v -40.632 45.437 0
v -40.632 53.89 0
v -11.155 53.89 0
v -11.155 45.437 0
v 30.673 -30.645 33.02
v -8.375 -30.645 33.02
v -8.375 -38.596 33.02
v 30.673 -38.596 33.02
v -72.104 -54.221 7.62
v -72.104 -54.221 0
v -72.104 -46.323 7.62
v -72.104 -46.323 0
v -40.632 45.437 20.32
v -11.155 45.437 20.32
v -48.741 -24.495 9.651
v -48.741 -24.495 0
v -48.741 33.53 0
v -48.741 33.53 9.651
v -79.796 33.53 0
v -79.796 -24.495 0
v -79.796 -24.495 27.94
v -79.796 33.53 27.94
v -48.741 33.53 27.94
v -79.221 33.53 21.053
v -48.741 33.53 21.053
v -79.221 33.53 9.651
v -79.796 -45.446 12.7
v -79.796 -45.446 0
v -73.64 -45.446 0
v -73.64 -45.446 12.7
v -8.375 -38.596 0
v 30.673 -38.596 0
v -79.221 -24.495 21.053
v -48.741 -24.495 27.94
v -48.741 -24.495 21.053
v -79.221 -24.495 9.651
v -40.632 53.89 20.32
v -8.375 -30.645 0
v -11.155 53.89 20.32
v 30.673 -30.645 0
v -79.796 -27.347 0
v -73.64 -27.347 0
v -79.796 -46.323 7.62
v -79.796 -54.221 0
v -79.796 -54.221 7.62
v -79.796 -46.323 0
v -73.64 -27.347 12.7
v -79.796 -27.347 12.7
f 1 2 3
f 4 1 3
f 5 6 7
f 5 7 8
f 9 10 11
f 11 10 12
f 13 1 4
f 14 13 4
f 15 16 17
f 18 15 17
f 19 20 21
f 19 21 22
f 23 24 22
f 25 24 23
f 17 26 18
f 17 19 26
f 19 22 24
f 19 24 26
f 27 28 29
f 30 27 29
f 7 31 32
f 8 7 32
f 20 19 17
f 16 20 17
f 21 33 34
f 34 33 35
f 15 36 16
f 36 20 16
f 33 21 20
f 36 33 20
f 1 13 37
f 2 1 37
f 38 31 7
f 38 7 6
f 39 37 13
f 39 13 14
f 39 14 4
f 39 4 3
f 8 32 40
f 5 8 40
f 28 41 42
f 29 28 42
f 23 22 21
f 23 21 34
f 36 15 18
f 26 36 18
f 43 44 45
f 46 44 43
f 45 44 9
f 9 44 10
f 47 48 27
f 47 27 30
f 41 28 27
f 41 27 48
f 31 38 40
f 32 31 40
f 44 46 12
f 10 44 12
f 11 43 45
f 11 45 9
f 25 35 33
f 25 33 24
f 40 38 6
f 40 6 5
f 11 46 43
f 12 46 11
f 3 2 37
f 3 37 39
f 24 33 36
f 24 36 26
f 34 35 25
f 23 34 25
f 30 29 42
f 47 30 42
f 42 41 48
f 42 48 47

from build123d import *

# Parameters (mm, degrees)
F0_W     = 31.0551151633
F0_H     = 58.0248460174
F1_DEPTH = 27.94
F0_W_2   = 6.1559900641
F0_H_2   = 18.0984884501
F2_DEPTH = 12.7
F0_W_3   = 7.6916143298
F0_H_3   = 7.8975185752
F3_DEPTH = 7.62
F0_W_4   = 39.0488561243
F0_H_4   = 7.9504065216
F4_DEPTH = 33.02
F0_W_5   = 29.4771557674
F0_H_5   = 8.4530077875
F5_DEPTH = 20.32
F6_W     = 58.0248460174
F6_H     = 11.4022633061
F7_DEPTH = 30.48


with BuildPart() as f1:
    # F0 (on Top) → F1 (new body)
    with BuildSketch(Plane.XY):
        with Locations((-64.2681159079, 4.5171789825)):
            Rectangle(F0_W, F0_H)
    extrude(amount=F1_DEPTH)

    # F6 (on face) → F7 (cut)
    with BuildSketch(Plane.YZ.offset(-48.7405583262)):
        with Locations((4.5171789825, 15.3517113067)):
            Rectangle(F6_W, F6_H)
    extrude(amount=-F7_DEPTH, mode=Mode.SUBTRACT)


with BuildPart() as f2:
    # F0 (on Top) → F2 (new body)
    with BuildSketch(Plane.XY):
        with Locations((-76.7176784575, -36.396369338)):
            Rectangle(F0_W_2, F0_H_2)
    extrude(amount=F2_DEPTH)


with BuildPart() as f3:
    # F0 (on Top) → F3 (new body)
    with BuildSketch(Plane.XY):
        with Locations((-75.9498663247, -50.2718761563)):
            Rectangle(F0_W_3, F0_H_3)
    extrude(amount=F3_DEPTH)


with BuildPart() as f4:
    # F0 (on Top) → F4 (new body)
    with BuildSketch(Plane.XY):
        with Locations((11.1489808187, -34.6204061061)):
            Rectangle(F0_W_4, F0_H_4)
    extrude(amount=F4_DEPTH)


with BuildPart() as f5:
    # F0 (on Top) → F5 (new body)
    with BuildSketch(Plane.XY):
        with Locations((-25.8931447752, 49.6630799025)):
            Rectangle(F0_W_5, F0_H_5)
    extrude(amount=F5_DEPTH)


solid = Compound([f1.part, f2.part, f3.part, f4.part, f5.part])
